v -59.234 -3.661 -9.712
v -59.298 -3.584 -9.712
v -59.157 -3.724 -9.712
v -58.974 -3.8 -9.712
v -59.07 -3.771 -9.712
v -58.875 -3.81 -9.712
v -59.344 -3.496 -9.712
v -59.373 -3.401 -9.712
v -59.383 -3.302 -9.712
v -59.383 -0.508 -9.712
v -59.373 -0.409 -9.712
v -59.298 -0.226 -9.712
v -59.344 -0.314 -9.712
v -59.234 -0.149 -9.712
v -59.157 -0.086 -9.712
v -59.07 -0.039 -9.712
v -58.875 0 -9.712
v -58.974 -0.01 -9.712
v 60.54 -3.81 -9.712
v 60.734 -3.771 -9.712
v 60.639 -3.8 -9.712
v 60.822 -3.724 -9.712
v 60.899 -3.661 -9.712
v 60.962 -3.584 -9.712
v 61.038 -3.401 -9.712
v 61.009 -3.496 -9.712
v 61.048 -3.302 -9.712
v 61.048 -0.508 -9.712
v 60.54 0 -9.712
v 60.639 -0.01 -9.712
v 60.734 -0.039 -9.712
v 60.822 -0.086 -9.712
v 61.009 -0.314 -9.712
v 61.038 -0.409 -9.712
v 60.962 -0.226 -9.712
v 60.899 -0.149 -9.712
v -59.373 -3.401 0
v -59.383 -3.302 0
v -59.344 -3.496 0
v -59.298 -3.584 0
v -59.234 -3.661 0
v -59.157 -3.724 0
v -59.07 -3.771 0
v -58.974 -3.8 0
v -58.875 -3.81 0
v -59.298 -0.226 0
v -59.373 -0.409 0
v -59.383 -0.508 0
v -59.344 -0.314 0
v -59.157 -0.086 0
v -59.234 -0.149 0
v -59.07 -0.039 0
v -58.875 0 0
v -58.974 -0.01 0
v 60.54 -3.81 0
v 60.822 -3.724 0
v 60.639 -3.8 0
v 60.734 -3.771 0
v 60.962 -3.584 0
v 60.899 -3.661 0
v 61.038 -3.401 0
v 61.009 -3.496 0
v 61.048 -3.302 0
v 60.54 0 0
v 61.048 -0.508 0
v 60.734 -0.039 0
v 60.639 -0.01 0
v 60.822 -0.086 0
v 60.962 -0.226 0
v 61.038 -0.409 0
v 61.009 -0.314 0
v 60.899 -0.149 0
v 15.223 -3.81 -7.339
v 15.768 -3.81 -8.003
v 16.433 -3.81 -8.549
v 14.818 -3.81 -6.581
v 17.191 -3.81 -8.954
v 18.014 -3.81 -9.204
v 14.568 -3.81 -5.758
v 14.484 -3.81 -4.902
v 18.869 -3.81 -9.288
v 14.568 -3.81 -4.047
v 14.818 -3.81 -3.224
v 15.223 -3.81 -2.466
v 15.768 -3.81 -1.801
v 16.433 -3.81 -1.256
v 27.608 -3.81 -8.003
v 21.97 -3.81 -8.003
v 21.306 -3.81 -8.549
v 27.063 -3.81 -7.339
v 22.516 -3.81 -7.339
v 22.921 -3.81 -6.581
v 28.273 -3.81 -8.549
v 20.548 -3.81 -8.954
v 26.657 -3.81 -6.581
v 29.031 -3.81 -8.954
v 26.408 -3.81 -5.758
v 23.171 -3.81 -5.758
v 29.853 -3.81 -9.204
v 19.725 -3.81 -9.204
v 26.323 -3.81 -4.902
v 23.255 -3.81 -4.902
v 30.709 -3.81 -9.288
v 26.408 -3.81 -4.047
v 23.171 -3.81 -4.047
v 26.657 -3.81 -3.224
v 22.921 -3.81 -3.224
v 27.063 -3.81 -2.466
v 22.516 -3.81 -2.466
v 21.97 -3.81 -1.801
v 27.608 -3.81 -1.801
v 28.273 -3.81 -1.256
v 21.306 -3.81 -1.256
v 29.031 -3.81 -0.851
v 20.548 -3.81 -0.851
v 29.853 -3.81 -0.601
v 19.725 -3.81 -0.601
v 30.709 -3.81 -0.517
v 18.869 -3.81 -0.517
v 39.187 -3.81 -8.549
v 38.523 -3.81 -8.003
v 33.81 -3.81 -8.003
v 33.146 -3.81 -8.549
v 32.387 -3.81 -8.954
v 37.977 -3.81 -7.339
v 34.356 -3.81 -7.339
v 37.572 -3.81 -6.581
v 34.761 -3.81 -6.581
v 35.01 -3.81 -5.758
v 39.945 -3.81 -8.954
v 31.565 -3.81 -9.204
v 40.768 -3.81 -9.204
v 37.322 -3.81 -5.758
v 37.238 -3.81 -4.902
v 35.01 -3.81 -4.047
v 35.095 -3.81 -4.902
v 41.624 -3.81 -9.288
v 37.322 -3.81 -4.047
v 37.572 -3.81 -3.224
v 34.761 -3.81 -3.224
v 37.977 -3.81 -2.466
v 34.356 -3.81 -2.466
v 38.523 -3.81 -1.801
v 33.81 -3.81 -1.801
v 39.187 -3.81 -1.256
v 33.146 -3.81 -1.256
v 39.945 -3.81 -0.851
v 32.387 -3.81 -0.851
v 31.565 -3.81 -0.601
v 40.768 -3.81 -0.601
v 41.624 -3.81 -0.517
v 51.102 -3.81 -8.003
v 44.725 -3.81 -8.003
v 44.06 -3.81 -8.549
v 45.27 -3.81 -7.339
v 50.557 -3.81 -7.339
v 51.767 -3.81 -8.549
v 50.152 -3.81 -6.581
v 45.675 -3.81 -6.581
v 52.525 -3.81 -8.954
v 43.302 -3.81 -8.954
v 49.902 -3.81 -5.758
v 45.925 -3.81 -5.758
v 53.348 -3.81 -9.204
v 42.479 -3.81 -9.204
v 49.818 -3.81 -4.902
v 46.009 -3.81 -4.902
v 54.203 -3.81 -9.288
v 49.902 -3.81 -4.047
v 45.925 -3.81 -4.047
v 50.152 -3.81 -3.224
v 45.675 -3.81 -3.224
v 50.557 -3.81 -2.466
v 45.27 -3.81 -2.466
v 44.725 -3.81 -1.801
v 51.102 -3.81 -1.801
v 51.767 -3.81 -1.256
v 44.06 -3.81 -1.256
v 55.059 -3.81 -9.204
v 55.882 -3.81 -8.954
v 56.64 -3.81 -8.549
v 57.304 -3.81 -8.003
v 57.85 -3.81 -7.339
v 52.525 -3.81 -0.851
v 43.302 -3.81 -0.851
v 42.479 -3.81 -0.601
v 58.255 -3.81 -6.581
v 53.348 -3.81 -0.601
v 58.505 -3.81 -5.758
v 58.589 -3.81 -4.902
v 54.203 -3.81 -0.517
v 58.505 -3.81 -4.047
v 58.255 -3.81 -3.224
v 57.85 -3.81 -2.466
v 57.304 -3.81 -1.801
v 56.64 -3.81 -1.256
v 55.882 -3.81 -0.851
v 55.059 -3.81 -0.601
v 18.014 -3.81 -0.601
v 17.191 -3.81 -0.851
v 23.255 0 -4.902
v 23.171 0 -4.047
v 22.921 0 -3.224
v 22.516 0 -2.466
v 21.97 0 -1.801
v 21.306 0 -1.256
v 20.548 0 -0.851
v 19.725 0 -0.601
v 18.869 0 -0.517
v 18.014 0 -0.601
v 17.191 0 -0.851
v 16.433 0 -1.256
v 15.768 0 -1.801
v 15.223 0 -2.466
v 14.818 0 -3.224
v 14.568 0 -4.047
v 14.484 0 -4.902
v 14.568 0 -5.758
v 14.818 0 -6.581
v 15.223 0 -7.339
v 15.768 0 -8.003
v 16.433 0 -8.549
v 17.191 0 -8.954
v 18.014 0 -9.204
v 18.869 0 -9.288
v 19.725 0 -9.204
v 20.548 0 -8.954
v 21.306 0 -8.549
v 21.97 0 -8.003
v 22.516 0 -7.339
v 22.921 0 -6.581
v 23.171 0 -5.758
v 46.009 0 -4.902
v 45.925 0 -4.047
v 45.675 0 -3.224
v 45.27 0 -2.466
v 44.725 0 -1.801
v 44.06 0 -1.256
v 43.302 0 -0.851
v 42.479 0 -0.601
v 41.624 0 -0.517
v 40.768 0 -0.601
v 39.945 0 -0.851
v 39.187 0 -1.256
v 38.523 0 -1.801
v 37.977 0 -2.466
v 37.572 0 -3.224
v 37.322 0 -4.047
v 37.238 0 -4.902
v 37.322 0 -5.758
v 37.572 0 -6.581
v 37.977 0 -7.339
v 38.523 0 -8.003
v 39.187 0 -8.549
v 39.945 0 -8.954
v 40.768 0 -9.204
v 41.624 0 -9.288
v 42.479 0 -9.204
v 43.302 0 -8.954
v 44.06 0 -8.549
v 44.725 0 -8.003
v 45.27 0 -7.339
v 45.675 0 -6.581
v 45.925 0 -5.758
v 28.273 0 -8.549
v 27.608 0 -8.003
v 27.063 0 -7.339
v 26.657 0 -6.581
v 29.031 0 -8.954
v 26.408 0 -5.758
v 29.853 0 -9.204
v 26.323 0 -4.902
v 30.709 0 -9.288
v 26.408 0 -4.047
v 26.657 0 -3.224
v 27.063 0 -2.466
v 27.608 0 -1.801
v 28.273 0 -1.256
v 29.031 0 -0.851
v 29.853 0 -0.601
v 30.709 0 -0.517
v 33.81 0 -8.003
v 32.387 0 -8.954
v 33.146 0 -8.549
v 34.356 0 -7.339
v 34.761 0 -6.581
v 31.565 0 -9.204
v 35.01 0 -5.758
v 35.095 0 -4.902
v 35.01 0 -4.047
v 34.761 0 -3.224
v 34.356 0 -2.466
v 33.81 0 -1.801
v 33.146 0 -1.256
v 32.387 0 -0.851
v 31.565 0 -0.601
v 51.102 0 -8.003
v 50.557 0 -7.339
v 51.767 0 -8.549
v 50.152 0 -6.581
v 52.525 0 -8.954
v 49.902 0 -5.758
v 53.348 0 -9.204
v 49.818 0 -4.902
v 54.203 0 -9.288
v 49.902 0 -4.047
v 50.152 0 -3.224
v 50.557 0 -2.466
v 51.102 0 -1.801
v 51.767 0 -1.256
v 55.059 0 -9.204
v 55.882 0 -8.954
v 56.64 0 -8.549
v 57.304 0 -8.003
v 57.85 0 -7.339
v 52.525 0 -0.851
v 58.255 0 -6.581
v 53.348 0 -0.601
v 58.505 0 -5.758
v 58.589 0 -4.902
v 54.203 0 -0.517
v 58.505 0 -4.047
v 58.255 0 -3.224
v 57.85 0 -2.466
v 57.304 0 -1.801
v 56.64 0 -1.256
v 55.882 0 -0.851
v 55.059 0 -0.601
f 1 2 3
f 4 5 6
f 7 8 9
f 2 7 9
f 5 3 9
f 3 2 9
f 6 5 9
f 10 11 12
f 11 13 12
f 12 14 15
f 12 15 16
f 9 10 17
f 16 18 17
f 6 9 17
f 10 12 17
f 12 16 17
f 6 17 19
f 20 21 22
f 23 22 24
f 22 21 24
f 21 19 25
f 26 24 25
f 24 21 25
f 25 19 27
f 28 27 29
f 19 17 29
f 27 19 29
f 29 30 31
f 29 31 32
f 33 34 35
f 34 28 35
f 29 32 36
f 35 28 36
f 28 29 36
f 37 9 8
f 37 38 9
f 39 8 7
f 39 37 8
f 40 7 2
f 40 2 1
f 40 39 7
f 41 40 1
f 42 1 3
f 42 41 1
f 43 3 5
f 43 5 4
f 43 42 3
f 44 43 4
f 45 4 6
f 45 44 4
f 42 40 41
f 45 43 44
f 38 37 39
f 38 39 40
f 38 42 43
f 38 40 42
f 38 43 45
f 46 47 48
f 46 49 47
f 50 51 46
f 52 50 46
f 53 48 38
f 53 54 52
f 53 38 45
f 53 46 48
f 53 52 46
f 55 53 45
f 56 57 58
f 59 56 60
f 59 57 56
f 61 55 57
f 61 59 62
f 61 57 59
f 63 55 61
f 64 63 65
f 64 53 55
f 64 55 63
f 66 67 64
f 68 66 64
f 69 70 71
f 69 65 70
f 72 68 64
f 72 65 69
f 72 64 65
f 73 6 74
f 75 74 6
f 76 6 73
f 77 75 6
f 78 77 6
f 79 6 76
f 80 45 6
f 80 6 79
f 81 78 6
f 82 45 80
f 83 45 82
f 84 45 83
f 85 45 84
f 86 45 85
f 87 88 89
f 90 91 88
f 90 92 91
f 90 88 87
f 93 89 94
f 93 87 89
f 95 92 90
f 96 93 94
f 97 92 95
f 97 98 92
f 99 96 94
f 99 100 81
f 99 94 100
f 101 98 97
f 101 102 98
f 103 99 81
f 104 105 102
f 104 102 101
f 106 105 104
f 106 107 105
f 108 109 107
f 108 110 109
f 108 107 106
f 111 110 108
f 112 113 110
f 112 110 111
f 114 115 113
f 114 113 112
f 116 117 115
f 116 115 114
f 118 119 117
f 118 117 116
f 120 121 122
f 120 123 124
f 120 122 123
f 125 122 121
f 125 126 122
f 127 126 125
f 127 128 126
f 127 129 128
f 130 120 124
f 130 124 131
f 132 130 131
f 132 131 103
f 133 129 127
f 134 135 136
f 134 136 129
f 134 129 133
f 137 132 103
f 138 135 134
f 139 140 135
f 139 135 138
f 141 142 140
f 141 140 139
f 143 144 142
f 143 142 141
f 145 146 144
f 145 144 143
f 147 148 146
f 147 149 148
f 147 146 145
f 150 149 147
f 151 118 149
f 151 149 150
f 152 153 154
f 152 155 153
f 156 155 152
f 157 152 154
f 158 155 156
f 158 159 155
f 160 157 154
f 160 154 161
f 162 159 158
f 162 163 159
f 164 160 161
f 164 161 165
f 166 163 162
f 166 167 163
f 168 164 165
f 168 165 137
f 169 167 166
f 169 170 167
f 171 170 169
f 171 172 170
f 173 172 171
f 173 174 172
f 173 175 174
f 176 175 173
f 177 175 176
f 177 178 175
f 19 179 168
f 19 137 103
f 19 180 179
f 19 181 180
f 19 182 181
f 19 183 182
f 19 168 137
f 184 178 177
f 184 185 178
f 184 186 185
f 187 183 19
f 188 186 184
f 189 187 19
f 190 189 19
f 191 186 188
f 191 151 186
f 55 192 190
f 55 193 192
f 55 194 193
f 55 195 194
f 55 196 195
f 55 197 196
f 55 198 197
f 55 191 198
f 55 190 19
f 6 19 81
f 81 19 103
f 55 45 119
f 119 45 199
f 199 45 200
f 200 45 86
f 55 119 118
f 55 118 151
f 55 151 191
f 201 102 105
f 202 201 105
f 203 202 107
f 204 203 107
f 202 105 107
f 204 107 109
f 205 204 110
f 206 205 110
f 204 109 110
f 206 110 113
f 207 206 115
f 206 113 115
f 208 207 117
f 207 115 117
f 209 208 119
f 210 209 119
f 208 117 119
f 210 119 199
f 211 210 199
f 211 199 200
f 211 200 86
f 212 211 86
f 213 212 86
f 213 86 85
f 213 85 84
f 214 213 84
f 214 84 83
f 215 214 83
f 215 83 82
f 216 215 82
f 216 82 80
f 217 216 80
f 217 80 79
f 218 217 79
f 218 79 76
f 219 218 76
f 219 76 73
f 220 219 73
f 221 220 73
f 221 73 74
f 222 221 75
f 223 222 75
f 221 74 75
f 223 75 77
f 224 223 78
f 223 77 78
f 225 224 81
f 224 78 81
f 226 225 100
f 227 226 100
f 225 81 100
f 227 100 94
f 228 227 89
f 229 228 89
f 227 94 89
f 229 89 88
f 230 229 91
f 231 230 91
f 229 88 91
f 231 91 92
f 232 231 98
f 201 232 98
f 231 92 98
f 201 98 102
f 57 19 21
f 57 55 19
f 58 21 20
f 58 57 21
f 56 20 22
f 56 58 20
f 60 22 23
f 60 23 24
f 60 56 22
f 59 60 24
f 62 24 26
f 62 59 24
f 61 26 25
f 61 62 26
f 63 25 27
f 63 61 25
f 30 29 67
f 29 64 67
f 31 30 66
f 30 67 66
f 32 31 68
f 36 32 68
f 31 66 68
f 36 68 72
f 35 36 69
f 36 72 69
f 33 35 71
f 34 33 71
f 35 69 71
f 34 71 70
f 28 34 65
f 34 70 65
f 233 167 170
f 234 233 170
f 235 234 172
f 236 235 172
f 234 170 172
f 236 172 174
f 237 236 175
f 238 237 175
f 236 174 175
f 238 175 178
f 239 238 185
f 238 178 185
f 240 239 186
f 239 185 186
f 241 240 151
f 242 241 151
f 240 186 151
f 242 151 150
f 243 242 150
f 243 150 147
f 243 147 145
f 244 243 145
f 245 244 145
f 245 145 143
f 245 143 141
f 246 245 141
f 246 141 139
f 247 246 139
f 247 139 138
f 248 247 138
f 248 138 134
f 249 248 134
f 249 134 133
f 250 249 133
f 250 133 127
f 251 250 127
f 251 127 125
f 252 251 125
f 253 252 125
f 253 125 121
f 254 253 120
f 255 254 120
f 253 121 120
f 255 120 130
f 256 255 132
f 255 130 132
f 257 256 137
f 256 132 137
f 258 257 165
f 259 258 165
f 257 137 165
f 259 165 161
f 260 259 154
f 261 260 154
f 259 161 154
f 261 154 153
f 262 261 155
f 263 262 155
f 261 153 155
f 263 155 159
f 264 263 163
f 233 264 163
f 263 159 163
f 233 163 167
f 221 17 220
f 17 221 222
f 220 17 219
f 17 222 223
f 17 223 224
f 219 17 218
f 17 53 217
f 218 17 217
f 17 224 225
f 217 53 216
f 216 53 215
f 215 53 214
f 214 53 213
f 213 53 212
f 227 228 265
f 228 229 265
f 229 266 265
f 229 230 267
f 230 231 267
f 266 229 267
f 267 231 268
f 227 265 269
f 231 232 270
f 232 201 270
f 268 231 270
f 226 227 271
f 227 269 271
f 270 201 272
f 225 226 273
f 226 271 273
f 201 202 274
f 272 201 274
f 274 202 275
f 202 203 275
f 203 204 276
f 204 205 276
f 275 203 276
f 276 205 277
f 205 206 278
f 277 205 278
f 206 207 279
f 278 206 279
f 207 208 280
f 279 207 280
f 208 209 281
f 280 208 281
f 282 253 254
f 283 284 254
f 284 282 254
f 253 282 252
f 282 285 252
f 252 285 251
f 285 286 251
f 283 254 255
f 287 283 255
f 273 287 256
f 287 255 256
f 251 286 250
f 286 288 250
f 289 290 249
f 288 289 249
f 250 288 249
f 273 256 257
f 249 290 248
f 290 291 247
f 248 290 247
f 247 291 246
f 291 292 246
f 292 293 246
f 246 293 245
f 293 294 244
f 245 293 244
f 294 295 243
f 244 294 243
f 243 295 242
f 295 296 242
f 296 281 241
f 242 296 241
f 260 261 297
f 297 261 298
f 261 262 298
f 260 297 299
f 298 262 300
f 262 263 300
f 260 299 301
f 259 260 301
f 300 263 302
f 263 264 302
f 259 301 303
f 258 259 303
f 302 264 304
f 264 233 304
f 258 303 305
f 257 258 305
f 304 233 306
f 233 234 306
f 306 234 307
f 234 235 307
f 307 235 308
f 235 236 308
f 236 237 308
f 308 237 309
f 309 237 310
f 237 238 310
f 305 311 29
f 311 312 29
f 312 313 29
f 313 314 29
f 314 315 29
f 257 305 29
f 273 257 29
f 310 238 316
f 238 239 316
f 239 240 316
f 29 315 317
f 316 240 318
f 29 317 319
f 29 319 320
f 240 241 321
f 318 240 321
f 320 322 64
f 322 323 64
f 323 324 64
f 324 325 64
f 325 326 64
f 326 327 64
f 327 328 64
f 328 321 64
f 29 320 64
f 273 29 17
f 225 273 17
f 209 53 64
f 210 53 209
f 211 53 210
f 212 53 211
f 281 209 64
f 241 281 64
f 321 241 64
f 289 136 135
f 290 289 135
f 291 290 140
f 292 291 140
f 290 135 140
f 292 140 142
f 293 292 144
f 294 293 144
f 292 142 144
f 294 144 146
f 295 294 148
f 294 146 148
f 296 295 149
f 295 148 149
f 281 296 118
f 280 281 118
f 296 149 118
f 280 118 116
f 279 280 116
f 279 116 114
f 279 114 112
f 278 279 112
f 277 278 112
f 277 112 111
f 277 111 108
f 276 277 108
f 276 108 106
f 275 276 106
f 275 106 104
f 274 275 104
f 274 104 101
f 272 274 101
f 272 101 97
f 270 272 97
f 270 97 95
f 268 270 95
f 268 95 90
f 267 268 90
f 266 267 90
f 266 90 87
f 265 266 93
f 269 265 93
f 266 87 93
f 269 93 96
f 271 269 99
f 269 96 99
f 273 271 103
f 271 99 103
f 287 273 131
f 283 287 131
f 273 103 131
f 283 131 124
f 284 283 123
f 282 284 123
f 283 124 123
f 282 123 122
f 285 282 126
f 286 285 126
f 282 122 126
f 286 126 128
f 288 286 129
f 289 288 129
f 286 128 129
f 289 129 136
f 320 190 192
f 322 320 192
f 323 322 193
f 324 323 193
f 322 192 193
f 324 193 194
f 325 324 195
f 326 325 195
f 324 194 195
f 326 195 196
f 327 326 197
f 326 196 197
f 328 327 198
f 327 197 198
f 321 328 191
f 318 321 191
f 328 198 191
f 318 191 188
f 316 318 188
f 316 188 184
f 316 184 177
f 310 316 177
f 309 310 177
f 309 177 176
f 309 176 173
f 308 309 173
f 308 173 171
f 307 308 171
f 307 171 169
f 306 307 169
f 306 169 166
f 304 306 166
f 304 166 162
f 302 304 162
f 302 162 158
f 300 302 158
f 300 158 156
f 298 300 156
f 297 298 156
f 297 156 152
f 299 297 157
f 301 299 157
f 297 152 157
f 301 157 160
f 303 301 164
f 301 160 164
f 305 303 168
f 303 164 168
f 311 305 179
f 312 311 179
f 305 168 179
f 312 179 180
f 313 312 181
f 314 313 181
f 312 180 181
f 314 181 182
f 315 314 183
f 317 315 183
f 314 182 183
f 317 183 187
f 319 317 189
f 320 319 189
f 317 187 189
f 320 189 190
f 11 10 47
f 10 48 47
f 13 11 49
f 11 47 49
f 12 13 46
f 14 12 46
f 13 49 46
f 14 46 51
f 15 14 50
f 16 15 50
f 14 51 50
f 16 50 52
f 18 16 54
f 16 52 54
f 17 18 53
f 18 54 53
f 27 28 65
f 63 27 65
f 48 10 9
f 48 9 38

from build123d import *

# Parameters (mm, degrees)
F0_W     = 120.43124
F0_H     = 9.712197
F1_DEPTH = 3.81
F2_R     = 4.385573
F3_DEPTH = 38.1
F4_R     = 0.508


with BuildPart() as f1:
    # F0 (on Front) → F1 (new body)
    with BuildSketch(Plane.XZ):
        with Locations((0.832474, -4.856098)):
            Rectangle(F0_W, F0_H)
    extrude(amount=F1_DEPTH)

    # F2 (on face) → F3 (cut)
    with BuildSketch(Plane.XZ.offset(3.81)):
        with Locations((18.869411, -4.902347)):
            Circle(F2_R)
        with Locations((30.709038, -4.902347)):
            Circle(F2_R)
        with Locations((41.6237, -4.902347)):
            Circle(F2_R)
        with Locations((54.203305, -4.902347)):
            Circle(F2_R)
    extrude(amount=-F3_DEPTH, mode=Mode.SUBTRACT)

    # F4
    f4_edges = [f1.edges().sort_by_distance(p)[0] for p in [
        (-59.383146, -3.81, -4.856098),
        (-59.383146, 0, -4.856098),
        (61.048094, 0, -4.856098),
        (61.048094, -3.81, -4.856098),
    ]]
    fillet(f4_edges, radius=F4_R)


solid = f1.part
